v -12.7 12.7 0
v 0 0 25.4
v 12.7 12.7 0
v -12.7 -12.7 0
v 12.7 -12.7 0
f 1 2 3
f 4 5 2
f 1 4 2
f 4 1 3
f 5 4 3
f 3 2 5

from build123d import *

# Parameters (mm, degrees)
F1_W     = 25.4
F1_H     = 25.4
F2_DEPTH = 25.4
F5_DEPTH = 25.4
F6_DEPTH = 25.4


with BuildPart() as f2:
    # F1 (on Top) → F2 (new body)
    with BuildSketch(Plane.XY):
        Rectangle(F1_W, F1_H)
    extrude(amount=F2_DEPTH)

    # F3 (on face) → F5 (cut)
    with BuildSketch(Plane.XZ.offset(12.7)):
        Polygon((-12.7, 25.4), (-12.7, 0), (0, 25.4), align=None)
        Polygon((12.7, 25.4), (0, 25.4), (12.7, 0), align=None)
    extrude(amount=-F5_DEPTH, mode=Mode.SUBTRACT)

    # F4 (on face) → F6 (cut)
    with BuildSketch(Plane.YZ.offset(12.7)):
        Polygon((-12.7, 25.4), (-12.7, 0), (0, 25.4), align=None)
        Polygon((12.7, 25.4), (0, 25.4), (12.7, 0), align=None)
    extrude(amount=-F6_DEPTH, mode=Mode.SUBTRACT)


solid = f2.part
